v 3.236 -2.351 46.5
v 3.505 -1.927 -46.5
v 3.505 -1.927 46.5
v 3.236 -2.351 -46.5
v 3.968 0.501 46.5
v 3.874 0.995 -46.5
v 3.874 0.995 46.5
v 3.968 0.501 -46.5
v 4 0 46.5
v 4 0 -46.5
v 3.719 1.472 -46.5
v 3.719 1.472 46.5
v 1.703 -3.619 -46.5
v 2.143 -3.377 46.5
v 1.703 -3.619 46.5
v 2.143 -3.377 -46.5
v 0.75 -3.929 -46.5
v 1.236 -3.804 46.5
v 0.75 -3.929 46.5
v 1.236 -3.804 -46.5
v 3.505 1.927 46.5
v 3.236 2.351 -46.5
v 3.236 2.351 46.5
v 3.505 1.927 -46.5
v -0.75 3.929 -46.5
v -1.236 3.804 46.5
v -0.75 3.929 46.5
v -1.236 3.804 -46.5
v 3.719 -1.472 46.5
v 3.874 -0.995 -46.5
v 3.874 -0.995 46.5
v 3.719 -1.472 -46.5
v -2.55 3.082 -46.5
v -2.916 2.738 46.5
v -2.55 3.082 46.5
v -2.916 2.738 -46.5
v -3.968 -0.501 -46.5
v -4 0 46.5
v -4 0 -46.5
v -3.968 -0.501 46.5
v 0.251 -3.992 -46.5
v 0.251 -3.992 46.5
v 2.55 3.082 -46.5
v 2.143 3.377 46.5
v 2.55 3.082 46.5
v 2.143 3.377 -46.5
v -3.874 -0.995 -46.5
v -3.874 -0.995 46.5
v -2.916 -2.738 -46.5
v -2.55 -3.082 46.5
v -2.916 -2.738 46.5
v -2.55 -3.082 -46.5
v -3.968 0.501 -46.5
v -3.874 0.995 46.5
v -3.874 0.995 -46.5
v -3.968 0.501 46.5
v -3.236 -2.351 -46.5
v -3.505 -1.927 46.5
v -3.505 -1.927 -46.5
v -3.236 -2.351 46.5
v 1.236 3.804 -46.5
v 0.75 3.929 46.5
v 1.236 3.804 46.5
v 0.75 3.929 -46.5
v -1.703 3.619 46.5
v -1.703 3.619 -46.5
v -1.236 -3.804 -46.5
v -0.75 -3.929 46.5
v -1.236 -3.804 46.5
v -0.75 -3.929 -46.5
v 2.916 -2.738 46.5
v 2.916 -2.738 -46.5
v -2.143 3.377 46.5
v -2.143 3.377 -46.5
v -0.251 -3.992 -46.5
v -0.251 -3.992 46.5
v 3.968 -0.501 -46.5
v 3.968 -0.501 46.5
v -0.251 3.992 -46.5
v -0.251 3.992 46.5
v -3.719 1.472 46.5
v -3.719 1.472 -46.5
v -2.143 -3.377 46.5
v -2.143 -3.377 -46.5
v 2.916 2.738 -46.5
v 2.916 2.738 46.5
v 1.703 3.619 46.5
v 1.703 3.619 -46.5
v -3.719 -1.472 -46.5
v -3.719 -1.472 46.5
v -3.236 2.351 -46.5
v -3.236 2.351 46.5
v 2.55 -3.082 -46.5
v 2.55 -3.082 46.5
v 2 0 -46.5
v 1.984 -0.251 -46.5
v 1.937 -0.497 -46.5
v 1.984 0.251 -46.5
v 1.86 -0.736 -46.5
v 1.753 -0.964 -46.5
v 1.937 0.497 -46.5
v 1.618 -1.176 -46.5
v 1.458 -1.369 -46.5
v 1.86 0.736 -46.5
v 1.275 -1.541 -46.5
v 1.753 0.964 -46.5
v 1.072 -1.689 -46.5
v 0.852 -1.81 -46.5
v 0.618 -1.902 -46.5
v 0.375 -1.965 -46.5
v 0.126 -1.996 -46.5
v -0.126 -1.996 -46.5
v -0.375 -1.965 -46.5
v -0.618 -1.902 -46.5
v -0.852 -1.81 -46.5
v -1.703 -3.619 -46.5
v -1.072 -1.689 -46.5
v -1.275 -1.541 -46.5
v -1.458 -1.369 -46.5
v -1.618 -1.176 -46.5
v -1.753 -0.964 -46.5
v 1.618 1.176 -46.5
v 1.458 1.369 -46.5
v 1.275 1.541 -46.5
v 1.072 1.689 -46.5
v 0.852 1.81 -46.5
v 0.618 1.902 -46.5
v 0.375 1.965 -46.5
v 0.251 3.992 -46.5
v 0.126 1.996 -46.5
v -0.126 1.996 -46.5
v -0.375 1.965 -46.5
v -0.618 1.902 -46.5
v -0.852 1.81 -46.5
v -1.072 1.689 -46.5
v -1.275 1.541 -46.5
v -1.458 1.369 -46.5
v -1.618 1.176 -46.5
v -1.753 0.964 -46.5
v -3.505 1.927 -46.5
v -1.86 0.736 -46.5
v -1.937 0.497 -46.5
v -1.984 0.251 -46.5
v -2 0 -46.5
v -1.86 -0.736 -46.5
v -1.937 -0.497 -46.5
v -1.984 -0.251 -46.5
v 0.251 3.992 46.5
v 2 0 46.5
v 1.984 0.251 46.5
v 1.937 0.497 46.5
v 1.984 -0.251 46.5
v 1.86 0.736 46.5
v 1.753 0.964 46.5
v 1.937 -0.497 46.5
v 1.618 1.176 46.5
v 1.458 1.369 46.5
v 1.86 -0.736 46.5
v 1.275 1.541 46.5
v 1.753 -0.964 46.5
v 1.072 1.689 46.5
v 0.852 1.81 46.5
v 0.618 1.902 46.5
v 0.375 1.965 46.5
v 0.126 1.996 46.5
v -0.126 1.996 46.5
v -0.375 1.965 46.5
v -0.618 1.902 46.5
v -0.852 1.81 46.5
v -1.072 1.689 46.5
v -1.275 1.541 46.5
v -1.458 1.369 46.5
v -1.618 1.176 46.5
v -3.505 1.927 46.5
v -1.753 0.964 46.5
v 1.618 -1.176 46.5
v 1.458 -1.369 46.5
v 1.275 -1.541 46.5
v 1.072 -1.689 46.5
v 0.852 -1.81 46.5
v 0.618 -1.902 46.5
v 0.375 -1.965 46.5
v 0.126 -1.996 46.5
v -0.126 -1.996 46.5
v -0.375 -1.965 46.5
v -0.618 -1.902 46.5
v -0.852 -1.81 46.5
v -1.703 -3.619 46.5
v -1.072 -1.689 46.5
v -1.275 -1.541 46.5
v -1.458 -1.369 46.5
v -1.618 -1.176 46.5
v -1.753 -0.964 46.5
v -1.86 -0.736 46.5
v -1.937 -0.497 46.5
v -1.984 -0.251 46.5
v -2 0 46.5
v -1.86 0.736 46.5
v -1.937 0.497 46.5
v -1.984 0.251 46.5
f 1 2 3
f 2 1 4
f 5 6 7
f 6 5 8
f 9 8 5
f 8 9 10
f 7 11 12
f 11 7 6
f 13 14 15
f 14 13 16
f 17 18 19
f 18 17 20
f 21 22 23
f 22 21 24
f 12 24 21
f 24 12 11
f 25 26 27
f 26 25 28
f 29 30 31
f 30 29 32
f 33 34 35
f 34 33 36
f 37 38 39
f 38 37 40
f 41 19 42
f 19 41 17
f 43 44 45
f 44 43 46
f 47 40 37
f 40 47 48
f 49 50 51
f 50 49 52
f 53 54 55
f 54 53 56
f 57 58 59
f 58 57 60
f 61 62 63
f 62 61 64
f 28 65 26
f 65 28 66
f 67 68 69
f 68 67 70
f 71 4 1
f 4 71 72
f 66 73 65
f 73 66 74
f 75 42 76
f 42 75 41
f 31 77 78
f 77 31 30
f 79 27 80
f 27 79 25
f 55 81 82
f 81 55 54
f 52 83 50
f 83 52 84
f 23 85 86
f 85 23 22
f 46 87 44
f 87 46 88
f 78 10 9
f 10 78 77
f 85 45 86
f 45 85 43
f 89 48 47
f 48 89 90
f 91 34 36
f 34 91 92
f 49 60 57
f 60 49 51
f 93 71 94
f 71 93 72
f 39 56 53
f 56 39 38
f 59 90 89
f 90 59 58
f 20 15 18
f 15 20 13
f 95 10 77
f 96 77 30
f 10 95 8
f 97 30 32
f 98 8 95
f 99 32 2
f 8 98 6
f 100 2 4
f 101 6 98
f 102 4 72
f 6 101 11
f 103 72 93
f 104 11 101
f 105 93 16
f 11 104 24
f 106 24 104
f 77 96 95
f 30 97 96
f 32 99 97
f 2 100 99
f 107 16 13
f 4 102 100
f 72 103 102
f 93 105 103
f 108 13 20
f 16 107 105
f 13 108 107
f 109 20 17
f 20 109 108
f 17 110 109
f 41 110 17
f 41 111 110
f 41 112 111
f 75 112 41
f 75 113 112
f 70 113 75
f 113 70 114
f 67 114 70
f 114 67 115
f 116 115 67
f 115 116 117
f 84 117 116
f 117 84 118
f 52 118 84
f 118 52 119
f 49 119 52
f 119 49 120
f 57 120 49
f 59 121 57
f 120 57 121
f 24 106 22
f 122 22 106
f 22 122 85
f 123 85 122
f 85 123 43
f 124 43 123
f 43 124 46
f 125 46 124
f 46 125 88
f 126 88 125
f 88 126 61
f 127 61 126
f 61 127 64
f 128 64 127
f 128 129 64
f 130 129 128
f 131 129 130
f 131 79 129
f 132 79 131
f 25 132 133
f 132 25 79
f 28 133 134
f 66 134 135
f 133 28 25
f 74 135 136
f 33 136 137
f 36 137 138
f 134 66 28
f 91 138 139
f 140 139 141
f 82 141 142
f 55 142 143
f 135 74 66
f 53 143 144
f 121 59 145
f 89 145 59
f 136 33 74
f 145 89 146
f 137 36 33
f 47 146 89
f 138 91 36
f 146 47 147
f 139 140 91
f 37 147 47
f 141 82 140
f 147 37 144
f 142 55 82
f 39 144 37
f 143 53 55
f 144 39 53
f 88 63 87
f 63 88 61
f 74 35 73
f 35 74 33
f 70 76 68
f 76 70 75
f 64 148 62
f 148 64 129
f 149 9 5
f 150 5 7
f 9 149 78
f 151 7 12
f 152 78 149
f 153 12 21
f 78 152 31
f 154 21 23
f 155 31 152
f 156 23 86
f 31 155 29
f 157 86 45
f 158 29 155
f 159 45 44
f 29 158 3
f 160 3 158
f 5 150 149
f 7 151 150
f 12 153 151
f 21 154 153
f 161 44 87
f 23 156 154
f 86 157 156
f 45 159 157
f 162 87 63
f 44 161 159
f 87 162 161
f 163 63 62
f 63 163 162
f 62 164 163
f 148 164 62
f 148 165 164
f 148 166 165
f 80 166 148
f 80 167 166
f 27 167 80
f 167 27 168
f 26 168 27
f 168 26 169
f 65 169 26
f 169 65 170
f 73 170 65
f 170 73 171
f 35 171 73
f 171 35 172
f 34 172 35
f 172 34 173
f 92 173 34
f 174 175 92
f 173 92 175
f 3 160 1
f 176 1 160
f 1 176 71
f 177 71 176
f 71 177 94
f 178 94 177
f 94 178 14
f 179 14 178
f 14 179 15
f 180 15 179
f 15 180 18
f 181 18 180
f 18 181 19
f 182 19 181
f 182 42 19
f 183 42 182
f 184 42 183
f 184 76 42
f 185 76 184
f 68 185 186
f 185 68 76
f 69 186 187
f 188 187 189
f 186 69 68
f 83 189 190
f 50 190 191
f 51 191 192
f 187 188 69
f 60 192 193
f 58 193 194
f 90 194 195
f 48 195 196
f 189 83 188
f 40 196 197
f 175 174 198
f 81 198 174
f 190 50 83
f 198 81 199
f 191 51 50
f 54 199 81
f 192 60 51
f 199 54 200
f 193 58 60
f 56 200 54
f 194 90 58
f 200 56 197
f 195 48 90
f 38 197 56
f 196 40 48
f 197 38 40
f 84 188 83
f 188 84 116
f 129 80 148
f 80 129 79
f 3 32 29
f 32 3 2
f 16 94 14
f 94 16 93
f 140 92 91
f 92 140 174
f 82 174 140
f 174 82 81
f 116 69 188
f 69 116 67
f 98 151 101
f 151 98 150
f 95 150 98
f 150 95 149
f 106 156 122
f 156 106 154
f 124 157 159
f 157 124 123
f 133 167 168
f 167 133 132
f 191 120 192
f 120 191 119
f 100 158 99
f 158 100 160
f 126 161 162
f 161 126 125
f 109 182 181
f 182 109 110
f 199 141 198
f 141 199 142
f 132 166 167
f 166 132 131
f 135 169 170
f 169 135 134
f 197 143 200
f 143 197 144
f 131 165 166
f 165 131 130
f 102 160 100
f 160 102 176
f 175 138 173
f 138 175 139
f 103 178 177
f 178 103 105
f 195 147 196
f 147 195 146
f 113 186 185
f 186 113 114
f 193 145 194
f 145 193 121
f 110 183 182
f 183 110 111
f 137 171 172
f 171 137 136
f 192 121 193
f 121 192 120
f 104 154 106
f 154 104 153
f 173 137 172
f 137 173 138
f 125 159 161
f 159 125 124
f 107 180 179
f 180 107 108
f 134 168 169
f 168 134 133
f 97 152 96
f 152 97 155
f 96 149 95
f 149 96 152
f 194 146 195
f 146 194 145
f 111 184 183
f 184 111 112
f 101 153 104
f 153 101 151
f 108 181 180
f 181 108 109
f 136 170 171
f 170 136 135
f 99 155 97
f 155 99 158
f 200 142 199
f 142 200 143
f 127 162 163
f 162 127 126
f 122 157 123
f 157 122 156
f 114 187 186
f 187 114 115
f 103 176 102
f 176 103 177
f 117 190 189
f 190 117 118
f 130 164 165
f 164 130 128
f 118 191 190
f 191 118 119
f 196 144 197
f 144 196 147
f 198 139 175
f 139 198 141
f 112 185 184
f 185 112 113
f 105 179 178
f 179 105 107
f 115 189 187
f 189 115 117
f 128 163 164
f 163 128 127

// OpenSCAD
$fn = 50;


difference() {
	union() {
		translate(v = [0, 0, -46.5000000000]) {
			cylinder(h = 93, r = 4.0000000000);
		}
	}
	union() {
		translate(v = [0, 0, -100.0000000000]) {
			cylinder(h = 200, r = 2.0000000000);
		}
	}
}
